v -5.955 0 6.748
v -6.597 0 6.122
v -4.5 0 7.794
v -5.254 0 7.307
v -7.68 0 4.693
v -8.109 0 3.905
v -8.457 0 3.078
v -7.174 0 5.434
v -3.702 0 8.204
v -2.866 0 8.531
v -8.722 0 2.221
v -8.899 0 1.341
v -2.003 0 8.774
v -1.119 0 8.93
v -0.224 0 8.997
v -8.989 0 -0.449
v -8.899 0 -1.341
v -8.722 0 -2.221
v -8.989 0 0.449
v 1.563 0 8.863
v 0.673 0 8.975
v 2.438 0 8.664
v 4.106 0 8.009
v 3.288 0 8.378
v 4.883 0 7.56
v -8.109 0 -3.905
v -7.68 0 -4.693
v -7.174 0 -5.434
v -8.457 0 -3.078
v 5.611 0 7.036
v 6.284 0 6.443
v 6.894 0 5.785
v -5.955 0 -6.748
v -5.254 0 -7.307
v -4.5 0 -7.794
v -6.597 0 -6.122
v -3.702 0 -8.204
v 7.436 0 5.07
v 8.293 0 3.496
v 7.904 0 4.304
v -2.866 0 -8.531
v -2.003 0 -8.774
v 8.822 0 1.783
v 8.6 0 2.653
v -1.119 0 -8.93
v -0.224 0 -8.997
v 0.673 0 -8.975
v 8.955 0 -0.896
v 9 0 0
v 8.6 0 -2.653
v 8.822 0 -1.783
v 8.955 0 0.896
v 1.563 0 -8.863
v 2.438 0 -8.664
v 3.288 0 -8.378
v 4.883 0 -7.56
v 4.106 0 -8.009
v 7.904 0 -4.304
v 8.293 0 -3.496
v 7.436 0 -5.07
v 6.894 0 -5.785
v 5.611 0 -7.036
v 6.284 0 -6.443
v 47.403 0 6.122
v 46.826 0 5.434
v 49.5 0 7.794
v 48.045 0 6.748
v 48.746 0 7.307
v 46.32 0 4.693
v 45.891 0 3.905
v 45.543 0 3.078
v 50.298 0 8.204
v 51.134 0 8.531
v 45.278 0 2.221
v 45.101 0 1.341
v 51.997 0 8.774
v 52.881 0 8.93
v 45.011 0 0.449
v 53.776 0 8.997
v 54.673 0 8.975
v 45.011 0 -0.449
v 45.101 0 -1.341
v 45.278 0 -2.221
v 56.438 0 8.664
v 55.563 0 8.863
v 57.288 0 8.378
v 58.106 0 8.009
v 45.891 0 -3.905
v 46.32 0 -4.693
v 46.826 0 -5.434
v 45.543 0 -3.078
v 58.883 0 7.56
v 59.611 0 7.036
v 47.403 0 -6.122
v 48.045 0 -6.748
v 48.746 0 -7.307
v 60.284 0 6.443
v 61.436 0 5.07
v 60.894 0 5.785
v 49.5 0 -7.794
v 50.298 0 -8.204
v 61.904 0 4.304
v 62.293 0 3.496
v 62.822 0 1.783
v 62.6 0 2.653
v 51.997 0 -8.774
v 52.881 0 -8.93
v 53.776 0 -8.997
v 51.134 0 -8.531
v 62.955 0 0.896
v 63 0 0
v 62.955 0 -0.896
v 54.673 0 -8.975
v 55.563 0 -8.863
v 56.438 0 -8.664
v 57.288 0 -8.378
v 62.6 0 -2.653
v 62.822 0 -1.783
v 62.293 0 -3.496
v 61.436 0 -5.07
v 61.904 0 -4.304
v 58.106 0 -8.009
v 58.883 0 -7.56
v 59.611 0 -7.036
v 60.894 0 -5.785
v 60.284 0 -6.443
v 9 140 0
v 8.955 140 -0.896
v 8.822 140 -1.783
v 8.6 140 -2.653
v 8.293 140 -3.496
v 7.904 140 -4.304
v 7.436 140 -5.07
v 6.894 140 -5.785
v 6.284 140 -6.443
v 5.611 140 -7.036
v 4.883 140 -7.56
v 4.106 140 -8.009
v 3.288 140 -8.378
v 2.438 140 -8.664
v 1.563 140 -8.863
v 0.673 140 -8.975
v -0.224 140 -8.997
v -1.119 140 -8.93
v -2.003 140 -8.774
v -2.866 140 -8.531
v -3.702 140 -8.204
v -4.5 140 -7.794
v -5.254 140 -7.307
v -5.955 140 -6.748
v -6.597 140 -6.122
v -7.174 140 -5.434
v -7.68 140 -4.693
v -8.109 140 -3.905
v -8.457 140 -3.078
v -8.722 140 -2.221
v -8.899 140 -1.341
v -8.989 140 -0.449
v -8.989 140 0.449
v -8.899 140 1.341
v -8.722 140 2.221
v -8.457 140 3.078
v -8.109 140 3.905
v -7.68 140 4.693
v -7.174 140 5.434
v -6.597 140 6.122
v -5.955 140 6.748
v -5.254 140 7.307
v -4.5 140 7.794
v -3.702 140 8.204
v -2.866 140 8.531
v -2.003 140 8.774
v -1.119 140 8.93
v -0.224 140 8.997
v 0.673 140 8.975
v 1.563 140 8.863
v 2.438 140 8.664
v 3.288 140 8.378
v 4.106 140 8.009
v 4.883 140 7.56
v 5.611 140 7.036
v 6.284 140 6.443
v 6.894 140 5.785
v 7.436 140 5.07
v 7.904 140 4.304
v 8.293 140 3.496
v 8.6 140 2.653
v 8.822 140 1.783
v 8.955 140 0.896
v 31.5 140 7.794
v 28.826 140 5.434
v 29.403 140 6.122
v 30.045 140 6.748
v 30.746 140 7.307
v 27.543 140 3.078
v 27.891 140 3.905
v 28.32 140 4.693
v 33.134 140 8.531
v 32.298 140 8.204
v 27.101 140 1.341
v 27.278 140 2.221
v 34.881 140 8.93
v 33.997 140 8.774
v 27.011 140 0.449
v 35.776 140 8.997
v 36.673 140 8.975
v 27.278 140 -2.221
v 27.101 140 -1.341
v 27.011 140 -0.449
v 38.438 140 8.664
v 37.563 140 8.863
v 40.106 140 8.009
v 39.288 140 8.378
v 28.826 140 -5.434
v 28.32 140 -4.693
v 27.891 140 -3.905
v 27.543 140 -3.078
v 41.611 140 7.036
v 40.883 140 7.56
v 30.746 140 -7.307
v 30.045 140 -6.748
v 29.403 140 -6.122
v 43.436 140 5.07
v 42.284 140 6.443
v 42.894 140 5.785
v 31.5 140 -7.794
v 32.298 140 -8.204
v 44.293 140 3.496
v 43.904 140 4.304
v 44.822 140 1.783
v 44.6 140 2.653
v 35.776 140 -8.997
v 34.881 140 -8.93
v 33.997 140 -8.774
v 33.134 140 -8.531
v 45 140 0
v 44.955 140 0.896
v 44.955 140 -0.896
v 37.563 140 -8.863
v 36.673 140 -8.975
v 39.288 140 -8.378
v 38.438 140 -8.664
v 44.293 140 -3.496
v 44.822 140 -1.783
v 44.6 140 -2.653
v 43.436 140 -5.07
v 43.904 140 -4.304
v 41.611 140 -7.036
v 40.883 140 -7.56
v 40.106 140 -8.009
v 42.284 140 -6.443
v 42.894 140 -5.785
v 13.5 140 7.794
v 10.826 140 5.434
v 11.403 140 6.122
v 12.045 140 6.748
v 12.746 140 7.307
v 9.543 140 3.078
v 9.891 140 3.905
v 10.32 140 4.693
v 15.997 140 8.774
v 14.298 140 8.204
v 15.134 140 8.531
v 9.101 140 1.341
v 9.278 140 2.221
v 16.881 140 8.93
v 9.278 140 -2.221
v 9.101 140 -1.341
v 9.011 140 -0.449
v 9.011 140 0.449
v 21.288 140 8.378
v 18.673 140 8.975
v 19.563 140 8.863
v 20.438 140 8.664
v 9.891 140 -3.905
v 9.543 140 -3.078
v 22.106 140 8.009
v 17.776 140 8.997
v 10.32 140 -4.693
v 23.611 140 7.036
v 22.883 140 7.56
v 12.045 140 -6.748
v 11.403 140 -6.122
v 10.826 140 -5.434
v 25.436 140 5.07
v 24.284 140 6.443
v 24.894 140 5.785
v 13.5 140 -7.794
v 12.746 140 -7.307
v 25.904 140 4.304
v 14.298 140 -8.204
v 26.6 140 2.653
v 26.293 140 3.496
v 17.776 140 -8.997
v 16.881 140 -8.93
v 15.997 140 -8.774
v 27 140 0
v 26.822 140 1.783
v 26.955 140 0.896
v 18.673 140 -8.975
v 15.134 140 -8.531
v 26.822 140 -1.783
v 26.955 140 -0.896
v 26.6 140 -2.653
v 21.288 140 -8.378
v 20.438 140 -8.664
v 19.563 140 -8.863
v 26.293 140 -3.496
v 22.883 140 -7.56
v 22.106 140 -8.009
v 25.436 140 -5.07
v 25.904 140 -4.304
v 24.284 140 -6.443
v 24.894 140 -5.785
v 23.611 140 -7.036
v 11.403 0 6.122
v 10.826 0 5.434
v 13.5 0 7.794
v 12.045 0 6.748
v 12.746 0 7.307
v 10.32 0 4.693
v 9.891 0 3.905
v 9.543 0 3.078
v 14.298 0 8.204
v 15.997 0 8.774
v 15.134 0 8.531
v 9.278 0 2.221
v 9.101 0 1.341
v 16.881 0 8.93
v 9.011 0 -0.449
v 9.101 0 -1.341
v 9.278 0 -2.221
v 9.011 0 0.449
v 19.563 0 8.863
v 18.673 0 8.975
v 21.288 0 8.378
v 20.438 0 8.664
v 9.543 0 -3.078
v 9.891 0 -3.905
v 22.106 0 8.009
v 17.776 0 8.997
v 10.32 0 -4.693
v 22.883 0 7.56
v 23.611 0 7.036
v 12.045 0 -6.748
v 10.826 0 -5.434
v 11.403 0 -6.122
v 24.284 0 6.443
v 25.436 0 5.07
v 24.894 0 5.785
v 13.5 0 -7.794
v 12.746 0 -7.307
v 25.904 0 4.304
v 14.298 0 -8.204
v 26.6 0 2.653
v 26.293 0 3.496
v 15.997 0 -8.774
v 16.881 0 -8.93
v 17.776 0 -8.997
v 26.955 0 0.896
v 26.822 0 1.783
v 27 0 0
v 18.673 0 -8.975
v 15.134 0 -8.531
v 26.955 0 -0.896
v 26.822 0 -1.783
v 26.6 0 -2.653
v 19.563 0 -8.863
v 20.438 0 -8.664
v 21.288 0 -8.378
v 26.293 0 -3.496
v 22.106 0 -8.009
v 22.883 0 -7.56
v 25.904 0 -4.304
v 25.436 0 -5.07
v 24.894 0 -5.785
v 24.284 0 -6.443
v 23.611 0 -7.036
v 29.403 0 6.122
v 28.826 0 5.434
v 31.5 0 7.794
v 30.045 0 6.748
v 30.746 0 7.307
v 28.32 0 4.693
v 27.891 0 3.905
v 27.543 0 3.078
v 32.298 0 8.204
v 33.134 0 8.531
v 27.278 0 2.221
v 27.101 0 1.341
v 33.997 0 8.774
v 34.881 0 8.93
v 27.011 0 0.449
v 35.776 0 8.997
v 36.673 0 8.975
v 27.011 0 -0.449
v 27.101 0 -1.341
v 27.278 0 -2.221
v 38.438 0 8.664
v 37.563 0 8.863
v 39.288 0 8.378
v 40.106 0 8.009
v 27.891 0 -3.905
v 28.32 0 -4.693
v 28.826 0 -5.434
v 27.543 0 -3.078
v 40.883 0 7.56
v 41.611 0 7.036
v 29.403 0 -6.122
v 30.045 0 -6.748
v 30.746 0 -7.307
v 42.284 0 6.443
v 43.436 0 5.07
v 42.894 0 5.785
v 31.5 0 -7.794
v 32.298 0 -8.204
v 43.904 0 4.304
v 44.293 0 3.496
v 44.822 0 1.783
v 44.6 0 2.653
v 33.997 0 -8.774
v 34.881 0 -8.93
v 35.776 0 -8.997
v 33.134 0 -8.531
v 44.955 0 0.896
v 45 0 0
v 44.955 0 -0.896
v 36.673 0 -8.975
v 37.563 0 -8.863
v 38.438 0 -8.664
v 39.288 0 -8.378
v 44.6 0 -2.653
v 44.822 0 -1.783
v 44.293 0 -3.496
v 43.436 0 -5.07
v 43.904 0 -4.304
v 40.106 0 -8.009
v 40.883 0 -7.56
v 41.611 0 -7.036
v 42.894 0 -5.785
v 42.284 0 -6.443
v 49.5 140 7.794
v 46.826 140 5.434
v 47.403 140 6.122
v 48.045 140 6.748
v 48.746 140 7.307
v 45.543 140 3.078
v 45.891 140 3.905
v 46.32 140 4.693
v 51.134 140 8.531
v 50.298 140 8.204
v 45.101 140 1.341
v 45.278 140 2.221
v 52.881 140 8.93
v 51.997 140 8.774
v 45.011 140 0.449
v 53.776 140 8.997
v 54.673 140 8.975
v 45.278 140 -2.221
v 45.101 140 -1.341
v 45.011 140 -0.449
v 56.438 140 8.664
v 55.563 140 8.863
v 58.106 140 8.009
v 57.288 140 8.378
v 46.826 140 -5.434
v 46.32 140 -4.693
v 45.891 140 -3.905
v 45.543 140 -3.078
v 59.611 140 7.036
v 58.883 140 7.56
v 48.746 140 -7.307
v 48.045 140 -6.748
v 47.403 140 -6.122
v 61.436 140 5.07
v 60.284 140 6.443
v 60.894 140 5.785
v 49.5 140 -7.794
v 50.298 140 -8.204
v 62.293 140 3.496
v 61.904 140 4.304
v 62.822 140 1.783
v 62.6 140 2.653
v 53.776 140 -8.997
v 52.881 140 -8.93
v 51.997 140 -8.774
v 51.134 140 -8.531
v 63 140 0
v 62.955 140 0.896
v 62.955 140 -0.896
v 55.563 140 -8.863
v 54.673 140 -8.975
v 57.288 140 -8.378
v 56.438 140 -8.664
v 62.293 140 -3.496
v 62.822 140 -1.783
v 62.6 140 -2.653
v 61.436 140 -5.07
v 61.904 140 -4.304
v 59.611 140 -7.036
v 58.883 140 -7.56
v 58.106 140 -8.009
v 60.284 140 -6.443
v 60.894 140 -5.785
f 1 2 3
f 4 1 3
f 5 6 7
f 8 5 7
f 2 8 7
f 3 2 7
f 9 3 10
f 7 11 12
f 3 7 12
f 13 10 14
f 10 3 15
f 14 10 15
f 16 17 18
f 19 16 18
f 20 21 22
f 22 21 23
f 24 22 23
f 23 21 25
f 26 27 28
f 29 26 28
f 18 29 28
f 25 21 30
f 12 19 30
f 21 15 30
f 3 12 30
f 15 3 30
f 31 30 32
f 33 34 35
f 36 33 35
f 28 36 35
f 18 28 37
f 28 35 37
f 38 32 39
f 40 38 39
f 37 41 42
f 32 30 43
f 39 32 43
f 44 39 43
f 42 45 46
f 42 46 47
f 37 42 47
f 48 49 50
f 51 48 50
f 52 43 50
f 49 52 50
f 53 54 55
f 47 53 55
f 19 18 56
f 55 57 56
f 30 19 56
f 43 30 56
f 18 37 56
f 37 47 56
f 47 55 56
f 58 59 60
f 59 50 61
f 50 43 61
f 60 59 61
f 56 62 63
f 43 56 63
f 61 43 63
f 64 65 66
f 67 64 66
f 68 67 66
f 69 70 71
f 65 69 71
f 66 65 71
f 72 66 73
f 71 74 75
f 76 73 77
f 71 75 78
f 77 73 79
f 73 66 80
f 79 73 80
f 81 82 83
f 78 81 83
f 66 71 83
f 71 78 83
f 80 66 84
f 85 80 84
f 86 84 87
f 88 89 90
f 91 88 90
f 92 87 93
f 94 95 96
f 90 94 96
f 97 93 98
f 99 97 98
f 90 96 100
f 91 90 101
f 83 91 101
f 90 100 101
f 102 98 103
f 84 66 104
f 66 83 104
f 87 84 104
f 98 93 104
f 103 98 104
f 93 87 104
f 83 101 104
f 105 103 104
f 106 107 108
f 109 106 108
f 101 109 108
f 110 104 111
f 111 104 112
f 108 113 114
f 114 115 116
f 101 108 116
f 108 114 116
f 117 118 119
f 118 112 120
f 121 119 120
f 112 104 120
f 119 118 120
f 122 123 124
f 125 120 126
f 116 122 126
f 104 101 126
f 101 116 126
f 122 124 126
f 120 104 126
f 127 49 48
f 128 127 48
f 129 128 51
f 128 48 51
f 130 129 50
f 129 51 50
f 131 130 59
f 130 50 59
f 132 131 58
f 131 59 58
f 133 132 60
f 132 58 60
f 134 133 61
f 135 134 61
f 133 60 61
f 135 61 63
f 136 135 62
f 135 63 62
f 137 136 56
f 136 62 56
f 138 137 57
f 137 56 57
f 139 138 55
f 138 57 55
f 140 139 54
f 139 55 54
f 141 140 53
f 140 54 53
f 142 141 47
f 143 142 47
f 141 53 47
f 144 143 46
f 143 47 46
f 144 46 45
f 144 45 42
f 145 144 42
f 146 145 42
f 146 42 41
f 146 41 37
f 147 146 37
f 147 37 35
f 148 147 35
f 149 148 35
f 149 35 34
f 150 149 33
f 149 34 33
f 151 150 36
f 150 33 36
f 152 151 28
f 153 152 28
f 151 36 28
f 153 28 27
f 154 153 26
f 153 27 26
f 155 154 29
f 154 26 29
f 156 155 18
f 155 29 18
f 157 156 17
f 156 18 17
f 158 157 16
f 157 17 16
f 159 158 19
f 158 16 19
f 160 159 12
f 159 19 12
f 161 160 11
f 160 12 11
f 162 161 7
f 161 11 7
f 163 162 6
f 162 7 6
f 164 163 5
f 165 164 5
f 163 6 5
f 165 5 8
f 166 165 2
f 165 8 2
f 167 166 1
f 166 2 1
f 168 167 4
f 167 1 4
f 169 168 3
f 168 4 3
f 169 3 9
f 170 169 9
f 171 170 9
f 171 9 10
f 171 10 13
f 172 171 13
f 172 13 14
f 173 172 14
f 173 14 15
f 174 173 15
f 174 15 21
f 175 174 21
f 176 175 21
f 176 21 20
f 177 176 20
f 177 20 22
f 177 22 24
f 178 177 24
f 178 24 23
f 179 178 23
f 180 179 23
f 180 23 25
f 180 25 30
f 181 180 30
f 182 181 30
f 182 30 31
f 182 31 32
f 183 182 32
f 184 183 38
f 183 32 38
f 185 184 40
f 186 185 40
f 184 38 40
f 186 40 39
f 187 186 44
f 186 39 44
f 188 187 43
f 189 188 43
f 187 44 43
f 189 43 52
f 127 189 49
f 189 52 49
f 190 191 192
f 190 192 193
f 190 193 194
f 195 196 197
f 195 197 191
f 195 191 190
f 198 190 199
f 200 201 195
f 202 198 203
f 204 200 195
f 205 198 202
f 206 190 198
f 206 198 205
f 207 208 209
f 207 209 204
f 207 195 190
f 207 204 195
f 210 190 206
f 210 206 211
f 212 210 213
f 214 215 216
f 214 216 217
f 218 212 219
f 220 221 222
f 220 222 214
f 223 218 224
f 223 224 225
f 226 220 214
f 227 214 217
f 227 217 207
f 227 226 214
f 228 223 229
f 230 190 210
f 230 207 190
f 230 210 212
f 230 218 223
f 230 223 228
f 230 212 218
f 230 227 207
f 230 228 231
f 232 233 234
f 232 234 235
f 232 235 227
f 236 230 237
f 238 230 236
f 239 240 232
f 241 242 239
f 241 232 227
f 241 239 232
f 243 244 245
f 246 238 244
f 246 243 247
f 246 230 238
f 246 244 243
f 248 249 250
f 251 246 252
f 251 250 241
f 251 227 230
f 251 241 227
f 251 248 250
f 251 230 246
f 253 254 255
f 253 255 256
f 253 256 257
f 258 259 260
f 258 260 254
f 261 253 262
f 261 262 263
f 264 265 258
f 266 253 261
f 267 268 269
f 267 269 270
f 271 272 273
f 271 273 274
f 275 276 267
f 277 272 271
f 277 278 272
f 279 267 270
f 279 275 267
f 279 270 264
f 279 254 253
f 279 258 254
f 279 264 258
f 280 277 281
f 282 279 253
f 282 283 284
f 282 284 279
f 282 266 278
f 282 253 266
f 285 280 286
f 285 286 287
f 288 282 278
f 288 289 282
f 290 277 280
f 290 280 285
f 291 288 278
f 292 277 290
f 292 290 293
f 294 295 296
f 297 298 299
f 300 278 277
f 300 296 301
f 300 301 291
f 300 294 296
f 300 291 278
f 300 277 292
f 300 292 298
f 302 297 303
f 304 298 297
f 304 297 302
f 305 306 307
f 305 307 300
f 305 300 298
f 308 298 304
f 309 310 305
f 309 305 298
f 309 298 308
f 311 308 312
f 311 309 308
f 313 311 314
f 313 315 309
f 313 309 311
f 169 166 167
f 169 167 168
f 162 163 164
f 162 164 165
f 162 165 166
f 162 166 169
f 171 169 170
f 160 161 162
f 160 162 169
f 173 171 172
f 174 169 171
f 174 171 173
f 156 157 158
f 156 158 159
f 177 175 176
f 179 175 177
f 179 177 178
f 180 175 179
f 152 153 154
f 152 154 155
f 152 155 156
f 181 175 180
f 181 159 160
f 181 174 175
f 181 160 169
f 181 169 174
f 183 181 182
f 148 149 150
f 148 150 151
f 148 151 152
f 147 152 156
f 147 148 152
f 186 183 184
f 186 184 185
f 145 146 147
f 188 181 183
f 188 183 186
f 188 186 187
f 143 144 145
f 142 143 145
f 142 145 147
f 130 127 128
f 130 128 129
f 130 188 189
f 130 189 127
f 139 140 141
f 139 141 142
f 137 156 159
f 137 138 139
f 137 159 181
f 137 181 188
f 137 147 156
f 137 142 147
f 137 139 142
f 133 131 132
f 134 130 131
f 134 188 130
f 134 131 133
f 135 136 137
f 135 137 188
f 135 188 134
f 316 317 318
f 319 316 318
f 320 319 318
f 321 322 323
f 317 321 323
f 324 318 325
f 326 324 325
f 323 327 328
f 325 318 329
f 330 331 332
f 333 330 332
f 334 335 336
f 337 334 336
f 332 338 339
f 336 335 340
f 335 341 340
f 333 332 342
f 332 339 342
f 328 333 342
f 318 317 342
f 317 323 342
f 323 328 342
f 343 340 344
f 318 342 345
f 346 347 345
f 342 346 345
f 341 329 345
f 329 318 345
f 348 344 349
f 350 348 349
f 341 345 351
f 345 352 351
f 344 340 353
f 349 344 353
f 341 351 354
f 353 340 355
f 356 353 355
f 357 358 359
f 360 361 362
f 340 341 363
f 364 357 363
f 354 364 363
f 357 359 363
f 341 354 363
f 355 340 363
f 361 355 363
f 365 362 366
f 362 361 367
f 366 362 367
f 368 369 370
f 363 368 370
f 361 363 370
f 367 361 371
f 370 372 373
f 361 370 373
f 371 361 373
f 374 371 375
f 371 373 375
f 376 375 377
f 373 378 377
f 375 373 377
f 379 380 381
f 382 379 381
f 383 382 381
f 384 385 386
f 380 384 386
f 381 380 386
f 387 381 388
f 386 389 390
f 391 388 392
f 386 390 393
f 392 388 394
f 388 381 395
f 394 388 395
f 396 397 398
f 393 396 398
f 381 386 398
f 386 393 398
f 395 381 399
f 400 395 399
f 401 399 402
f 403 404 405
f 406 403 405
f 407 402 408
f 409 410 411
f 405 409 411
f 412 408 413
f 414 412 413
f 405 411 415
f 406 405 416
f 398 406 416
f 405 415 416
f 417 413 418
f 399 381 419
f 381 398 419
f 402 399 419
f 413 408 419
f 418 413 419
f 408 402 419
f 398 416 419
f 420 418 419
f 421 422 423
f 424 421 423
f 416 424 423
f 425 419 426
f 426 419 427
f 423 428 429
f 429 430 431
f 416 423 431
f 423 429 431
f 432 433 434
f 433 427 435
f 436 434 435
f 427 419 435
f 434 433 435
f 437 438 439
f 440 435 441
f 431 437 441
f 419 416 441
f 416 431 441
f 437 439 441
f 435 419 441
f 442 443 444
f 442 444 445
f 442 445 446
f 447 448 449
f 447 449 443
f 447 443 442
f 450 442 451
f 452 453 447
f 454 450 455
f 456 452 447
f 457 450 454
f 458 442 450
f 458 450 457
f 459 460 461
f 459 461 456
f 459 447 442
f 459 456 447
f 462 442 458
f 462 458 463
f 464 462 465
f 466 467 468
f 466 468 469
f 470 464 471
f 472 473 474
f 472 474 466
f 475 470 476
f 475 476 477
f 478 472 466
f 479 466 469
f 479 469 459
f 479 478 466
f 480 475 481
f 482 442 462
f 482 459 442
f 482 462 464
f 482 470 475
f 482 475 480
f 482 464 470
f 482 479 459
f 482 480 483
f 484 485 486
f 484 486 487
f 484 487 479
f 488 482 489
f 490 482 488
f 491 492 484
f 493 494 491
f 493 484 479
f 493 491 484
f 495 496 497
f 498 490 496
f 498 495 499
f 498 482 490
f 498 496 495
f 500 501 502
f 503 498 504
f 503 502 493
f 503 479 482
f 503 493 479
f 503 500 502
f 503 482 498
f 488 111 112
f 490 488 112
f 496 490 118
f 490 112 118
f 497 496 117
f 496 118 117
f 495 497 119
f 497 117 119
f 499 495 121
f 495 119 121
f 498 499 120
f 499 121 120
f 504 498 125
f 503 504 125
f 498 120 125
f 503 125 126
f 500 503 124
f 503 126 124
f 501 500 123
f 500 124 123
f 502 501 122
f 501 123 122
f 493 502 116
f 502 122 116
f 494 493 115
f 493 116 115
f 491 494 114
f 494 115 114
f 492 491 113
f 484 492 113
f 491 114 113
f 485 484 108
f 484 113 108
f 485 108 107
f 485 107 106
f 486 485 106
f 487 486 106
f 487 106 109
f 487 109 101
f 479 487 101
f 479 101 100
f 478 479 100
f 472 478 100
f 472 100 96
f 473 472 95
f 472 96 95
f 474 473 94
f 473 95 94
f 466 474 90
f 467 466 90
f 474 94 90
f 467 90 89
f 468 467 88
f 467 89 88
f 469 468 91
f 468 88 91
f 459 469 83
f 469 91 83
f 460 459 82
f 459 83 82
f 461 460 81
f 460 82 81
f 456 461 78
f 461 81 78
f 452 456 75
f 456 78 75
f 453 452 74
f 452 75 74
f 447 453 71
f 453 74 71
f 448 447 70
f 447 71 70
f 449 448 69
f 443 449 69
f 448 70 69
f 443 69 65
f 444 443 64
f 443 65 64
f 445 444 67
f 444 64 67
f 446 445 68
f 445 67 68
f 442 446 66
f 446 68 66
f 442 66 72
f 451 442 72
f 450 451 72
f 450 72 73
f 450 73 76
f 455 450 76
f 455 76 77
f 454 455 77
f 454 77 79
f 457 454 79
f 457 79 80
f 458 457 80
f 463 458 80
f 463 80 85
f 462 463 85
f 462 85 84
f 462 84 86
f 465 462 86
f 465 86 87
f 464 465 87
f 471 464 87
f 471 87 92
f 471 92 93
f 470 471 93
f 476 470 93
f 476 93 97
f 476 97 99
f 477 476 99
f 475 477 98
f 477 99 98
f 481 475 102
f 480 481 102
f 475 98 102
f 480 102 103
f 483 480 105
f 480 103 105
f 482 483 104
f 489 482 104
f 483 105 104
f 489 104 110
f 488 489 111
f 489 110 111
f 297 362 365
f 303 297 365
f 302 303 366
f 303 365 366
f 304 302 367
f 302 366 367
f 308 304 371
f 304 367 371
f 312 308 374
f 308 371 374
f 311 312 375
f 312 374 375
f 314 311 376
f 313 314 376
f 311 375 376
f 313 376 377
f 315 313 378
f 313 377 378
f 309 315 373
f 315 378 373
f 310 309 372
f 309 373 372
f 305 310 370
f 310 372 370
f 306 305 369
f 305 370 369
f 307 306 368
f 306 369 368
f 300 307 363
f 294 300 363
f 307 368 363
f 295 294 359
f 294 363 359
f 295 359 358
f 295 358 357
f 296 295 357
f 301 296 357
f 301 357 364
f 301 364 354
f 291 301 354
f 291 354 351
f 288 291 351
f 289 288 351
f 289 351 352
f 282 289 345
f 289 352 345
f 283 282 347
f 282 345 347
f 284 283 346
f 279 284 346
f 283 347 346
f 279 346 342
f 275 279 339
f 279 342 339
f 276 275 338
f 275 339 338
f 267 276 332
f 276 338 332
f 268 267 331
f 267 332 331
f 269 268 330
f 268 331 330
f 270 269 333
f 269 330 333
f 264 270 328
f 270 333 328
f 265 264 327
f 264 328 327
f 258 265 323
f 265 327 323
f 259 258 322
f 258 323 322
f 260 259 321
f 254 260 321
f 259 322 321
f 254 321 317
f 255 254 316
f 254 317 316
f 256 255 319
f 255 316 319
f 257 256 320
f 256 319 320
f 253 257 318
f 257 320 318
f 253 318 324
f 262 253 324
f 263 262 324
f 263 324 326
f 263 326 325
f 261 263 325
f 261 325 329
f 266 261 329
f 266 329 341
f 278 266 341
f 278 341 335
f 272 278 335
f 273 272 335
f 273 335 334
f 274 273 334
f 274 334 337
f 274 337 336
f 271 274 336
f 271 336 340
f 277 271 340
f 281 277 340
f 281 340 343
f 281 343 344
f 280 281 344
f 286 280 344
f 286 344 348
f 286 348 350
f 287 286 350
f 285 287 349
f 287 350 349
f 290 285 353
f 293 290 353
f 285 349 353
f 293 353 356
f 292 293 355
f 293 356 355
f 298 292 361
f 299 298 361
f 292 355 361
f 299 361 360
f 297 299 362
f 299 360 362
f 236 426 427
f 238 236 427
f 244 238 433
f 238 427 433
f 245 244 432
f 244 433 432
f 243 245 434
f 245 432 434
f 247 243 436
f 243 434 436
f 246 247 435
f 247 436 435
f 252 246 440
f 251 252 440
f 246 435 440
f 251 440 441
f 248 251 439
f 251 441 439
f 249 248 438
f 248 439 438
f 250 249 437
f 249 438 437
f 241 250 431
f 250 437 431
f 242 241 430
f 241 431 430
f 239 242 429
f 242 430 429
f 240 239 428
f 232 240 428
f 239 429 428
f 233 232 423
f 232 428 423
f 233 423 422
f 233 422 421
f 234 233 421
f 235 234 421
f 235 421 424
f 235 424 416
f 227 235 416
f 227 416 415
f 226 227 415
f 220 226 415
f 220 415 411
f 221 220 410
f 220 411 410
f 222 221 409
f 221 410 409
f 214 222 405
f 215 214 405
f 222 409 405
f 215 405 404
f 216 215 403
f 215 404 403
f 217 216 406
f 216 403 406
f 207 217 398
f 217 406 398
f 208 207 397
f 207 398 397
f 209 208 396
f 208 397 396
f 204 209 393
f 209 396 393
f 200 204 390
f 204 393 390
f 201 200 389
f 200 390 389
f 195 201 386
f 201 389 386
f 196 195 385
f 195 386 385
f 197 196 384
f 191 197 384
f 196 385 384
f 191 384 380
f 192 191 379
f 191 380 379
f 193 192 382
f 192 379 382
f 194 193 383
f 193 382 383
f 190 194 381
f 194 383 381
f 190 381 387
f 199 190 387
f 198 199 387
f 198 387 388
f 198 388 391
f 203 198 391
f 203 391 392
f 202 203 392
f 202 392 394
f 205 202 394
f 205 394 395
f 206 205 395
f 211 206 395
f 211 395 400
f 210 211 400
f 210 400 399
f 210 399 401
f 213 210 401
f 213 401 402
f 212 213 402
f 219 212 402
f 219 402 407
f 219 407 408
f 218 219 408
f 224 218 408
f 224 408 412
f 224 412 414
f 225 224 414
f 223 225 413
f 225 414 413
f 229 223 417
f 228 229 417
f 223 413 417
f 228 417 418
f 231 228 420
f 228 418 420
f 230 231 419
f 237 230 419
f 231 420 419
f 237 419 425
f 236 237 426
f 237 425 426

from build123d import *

# Parameters (mm, degrees)
SKETCH1_R             = 9
BOSS_EXTRUDE1_DEPTH   = 140
BOSS_EXTRUDE1_2_DEPTH = 140
BOSS_EXTRUDE1_3_DEPTH = 140
BOSS_EXTRUDE1_4_DEPTH = 140


with BuildPart() as part:
    # Sketch1 → Boss-Extrude1 (new body)
    with BuildSketch(Plane(origin=(0, 0, 0), x_dir=(1, 0, 0), z_dir=(0, 1, 0))):
        Circle(SKETCH1_R)
    extrude(amount=BOSS_EXTRUDE1_DEPTH)


with BuildPart() as body_2:
    # Sketch1 → Boss-Extrude1 2 (new body)
    with BuildSketch(Plane(origin=(0, 0, 0), x_dir=(1, 0, 0), z_dir=(0, 1, 0))):
        with Locations((18, 0)):
            Circle(SKETCH1_R)
    extrude(amount=BOSS_EXTRUDE1_2_DEPTH)


with BuildPart() as body_3:
    # Sketch1 → Boss-Extrude1 3 (new body)
    with BuildSketch(Plane(origin=(0, 0, 0), x_dir=(1, 0, 0), z_dir=(0, 1, 0))):
        with Locations((36, 0)):
            Circle(SKETCH1_R)
    extrude(amount=BOSS_EXTRUDE1_3_DEPTH)


with BuildPart() as body_4:
    # Sketch1 → Boss-Extrude1 4 (new body)
    with BuildSketch(Plane(origin=(0, 0, 0), x_dir=(1, 0, 0), z_dir=(0, 1, 0))):
        with Locations((54, 0)):
            Circle(SKETCH1_R)
    extrude(amount=BOSS_EXTRUDE1_4_DEPTH)


solid = Compound([part.part, body_2.part, body_3.part, body_4.part])
